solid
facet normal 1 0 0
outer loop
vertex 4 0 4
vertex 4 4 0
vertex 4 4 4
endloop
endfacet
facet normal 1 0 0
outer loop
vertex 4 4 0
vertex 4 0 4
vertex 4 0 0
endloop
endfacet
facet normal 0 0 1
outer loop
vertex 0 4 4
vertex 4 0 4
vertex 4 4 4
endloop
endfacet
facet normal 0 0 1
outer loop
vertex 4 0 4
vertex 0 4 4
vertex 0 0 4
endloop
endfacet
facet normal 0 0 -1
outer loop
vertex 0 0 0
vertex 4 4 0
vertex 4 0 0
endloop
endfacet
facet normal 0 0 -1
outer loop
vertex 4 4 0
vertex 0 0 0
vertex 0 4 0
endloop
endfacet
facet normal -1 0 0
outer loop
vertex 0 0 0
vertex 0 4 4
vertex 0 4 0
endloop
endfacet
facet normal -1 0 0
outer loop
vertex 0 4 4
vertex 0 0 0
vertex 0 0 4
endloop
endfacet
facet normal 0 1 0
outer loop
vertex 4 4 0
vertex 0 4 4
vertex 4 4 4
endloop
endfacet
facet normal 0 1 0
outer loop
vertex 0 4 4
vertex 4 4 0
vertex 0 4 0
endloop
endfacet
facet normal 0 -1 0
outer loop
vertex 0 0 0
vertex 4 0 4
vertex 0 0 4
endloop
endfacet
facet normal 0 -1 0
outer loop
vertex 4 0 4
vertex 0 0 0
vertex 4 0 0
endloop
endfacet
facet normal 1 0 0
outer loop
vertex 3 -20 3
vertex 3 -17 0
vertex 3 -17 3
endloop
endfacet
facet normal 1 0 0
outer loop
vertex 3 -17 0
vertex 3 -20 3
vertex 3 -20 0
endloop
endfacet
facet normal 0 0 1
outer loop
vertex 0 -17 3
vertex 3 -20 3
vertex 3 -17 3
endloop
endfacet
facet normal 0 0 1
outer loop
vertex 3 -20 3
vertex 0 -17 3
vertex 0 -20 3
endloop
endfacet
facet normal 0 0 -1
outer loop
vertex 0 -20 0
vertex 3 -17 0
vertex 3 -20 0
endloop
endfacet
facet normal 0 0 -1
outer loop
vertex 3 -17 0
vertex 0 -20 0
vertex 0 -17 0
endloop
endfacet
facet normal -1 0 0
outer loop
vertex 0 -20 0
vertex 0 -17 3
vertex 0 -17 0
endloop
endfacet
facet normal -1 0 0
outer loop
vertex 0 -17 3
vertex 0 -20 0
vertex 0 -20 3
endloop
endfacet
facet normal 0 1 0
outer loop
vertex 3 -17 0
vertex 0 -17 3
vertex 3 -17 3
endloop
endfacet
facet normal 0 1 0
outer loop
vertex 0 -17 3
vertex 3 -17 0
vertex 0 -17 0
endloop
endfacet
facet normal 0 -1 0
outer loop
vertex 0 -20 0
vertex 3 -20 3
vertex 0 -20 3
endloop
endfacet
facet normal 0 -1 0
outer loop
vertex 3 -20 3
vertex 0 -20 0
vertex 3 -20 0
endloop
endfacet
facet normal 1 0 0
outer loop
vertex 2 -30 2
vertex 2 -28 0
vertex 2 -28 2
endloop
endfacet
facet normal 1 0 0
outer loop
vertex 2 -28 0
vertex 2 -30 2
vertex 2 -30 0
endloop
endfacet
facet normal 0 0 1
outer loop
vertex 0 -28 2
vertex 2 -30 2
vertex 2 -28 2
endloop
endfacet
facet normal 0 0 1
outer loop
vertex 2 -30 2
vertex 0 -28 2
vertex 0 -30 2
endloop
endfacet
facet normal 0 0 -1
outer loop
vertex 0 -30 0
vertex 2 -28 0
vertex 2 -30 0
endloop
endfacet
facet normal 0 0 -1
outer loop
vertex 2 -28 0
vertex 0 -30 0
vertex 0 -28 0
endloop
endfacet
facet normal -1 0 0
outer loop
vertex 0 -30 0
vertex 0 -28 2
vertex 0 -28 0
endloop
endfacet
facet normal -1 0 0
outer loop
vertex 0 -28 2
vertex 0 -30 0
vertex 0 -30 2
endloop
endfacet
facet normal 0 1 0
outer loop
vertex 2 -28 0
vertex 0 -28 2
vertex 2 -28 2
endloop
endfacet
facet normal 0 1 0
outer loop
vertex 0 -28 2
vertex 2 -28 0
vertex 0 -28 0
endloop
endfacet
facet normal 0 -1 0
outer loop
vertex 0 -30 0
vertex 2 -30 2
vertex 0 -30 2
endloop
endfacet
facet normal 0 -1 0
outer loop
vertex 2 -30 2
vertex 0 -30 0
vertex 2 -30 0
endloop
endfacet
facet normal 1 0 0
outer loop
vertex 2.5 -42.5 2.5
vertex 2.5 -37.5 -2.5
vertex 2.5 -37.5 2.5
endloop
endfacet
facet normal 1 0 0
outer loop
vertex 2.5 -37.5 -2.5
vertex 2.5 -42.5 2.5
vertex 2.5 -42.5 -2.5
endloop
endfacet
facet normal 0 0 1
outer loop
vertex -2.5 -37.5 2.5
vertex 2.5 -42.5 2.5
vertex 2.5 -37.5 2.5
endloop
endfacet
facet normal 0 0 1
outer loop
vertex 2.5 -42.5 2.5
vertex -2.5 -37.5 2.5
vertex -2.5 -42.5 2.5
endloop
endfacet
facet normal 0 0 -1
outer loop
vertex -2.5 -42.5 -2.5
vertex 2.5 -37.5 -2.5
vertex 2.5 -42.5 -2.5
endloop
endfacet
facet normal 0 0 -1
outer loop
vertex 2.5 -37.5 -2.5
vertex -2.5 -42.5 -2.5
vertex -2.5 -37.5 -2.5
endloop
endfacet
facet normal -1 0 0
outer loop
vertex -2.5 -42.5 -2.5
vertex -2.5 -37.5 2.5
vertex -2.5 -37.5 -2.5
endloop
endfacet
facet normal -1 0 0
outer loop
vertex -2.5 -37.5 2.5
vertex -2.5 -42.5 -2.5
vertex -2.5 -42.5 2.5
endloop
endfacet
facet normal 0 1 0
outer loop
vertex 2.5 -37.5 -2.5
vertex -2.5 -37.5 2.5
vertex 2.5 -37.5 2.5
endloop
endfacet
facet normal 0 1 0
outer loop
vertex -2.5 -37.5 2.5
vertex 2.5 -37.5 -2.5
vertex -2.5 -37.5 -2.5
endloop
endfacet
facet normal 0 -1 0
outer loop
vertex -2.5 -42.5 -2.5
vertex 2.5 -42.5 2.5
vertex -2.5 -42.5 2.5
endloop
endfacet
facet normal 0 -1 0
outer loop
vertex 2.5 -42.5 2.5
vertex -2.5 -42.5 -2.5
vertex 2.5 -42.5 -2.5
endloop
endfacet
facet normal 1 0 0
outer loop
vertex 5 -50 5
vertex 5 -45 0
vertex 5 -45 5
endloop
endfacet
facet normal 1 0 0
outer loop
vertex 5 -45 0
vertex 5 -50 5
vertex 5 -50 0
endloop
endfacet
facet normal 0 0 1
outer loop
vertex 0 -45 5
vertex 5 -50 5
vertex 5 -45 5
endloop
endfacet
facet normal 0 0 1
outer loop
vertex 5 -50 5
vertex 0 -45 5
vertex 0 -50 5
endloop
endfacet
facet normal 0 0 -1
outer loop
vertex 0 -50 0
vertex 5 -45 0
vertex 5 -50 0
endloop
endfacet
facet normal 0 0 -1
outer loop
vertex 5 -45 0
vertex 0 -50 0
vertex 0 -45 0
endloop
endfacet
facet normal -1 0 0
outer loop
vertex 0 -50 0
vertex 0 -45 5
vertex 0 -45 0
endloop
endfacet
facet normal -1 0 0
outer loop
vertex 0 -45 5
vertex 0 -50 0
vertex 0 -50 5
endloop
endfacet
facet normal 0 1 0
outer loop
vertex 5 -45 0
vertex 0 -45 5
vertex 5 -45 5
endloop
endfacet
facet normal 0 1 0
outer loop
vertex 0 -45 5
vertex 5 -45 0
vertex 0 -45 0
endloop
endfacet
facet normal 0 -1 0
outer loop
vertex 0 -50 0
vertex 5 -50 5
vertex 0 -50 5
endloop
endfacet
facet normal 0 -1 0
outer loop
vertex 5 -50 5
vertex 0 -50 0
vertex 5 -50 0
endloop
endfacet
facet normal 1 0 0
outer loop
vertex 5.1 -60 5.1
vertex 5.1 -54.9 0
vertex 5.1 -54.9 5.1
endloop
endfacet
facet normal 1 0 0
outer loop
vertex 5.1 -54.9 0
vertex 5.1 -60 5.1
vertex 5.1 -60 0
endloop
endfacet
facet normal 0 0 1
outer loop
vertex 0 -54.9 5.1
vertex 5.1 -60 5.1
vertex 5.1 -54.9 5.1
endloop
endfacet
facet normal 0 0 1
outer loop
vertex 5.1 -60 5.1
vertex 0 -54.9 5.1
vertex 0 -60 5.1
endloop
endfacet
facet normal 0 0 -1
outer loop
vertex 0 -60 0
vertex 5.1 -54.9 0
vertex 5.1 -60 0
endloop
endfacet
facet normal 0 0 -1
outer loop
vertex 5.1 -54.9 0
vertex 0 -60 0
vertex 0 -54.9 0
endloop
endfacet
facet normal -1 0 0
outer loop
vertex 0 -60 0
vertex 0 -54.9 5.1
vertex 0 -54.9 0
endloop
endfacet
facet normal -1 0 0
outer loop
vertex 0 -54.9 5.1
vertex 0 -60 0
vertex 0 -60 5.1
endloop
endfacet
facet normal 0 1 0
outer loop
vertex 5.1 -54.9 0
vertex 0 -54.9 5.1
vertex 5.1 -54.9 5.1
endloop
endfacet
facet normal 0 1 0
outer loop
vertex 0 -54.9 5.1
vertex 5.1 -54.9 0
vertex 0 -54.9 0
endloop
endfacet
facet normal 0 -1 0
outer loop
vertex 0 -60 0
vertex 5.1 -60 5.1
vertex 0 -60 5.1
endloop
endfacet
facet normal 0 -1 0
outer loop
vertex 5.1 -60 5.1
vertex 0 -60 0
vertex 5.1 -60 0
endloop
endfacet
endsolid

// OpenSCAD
// Generated by SolidPython 1.0.5 on 2021-06-01 18:16:34
$fn = 48;

a_numbers_dropdown = 4; // [2, 4, 12, 14]
b_strings_dropdown = "foo"; // [foo, bar, baz]
c_slider = 3; // [1: 10]
d_step_slider = 2; // [0: 5: 100]
e_checkbox = true;
f_spinbox = 5;
g_float_spinbox = 5.1;
h_textbox = "hello";


union() {
	translate(v = [0, 0, 0]) {
		cube(size = a_numbers_dropdown);
	}
	translate(v = [0, -10, 0]) {
		text(text = b_strings_dropdown);
	}
	translate(v = [0, -20, 0]) {
		cube(size = c_slider);
	}
	translate(v = [0, -30, 0]) {
		cube(size = d_step_slider);
	}
	translate(v = [0, -40, 0]) {
		cube(center = e_checkbox, size = 5);
	}
	translate(v = [0, -50, 0]) {
		cube(size = f_spinbox);
	}
	translate(v = [0, -60, 0]) {
		cube(size = g_float_spinbox);
	}
	translate(v = [0, -70, 0]) {
		text(text = h_textbox);
	}
}
/***********************************************
*********      SolidPython code:      **********
************************************************
 
#! /usr/bin/env python3

from solid import (cylinder, rotate, translate, scad_render_to_file, union, cube, text)
from solid.customizer import (CustomizerCheckbox, CustomizerDropdownString, CustomizerSlider,
    CustomizerDropdownNumber, CustomizerSpinbox, CustomizerTextbox)
SEGMENTS = 48

def ported_scad_example():
    elts = []

    # // combo box for number
    # SCAD: a_numbers_dropdown = 4; // [2, 4, 12, 14]
    a_numbers_dropdown = CustomizerDropdownNumber('a_numbers_dropdown', 4, [2, 4, 12, 14])
    elts.append (cube(a_numbers_dropdown))

    # // combo box for string
    # SCAD: b_strings_dropdown = "foo"; // [foo, bar, baz]    
    b_strings_dropdown = CustomizerDropdownString('b_strings_dropdown', 'foo', ['foo', 'bar', 'baz']  )
    elts.append( text(b_strings_dropdown))

    # // labeled combo box for string
    # Strings = "M"; // []

    # // slider widget for number
    # SCAD: slider =34; // [10:100]
    c_slider = CustomizerSlider('c_slider', 3, 1, 10)
    elts.append( cube(c_slider))

    # //step slider for number
    # SCAD: stepSlider=2; //[0:5:100]
    d_step_slider = CustomizerSlider('d_step_slider', 2, 0, 100, 5)
    elts.append( cube(d_step_slider))

    # Checkbox
    # SCAD: e_checkbox = true;
    e_checkbox = CustomizerCheckbox('e_checkbox', True)
    elts.append( cube(size=5, center=e_checkbox))

    # Spinbox with step size 1
    # SCAD: f_spinbox = 5;
    f_spinbox = CustomizerSpinbox('f_spinbox', 5)
    elts.append( cube(f_spinbox))

    # // spinbox with step size 0.01
    # SCAD: g_float_spinbox = 5.1;
    g_float_spinbox = CustomizerSpinbox('g_float_spinbox', 5.1)
    elts.append( cube(g_float_spinbox))

    # Textbox:
    # // Text box for string
    # SCAD: h_textbox = "hello";    
    h_textbox = CustomizerTextbox('h_textbox', 'hello')
    elts.append( text(h_textbox))

    # TODO: compound Spinboxes for 1-4 numbers, & textbox for 5+ numbers

    # Move everything down in a line from y=0 so we can see the different objects
    elts = [translate([0,-10*i,0])(e) for i,e in enumerate(elts)]

    # And return everything; Customizer instances that aren't used in OpenSCAD
    # objects and rendered won't appear in the final SCAD file
    a = union()( elts )
    return a

def custom_cube():
    side_length = CustomizerSlider('sideLength', 1, min_val=1, max_val=10, step=1)
    offset= CustomizerSlider('offset', 2, 0, 10, 2)
    angle = CustomizerSlider('angle', 0, 0, 90) # Note no step value; OpenSCAD supplies

    # Once you've defined your Customizer objects, use them naturally like you 
    # would Python variables. SolidPython will put the correct OpenSCAD code at 
    # the beginning of the file so that the GUI is defined.
    a = rotate([0, 0, angle])(
        translate([offset, offset, 0])(
            cylinder(r1=2*side_length, r2=side_length, h=3*side_length)
        )
    )

    return a

# FIXME: include examples of ways we *can't* use Customizer objects just like 
# Python variables. Basically, you can use a Customizer as an argument to an OpenSCAD
# function, but if you're doing pure Python things, OpenSCAD won't pick up on the
# use of a Customizer variable. 
# E.g. ```
# slider_val = CustomizedSlider('slider_val', val=4, min_val=2, max_val=10)
# objs = [some_obj(i) for i in range(slider_val)]
# ```
# This will always return 4 objects, since the list comprehension is pure Python
# and won't be passed on to OpenSCAD.

if __name__ == '__main__':
    a = custom_cube()
    a = ported_scad_example()
    out_path = scad_render_to_file(a, file_header='$fn = %s;' % SEGMENTS, include_orig_code=True)
    print(f'Wrote file to {out_path}') 
 
************************************************/
